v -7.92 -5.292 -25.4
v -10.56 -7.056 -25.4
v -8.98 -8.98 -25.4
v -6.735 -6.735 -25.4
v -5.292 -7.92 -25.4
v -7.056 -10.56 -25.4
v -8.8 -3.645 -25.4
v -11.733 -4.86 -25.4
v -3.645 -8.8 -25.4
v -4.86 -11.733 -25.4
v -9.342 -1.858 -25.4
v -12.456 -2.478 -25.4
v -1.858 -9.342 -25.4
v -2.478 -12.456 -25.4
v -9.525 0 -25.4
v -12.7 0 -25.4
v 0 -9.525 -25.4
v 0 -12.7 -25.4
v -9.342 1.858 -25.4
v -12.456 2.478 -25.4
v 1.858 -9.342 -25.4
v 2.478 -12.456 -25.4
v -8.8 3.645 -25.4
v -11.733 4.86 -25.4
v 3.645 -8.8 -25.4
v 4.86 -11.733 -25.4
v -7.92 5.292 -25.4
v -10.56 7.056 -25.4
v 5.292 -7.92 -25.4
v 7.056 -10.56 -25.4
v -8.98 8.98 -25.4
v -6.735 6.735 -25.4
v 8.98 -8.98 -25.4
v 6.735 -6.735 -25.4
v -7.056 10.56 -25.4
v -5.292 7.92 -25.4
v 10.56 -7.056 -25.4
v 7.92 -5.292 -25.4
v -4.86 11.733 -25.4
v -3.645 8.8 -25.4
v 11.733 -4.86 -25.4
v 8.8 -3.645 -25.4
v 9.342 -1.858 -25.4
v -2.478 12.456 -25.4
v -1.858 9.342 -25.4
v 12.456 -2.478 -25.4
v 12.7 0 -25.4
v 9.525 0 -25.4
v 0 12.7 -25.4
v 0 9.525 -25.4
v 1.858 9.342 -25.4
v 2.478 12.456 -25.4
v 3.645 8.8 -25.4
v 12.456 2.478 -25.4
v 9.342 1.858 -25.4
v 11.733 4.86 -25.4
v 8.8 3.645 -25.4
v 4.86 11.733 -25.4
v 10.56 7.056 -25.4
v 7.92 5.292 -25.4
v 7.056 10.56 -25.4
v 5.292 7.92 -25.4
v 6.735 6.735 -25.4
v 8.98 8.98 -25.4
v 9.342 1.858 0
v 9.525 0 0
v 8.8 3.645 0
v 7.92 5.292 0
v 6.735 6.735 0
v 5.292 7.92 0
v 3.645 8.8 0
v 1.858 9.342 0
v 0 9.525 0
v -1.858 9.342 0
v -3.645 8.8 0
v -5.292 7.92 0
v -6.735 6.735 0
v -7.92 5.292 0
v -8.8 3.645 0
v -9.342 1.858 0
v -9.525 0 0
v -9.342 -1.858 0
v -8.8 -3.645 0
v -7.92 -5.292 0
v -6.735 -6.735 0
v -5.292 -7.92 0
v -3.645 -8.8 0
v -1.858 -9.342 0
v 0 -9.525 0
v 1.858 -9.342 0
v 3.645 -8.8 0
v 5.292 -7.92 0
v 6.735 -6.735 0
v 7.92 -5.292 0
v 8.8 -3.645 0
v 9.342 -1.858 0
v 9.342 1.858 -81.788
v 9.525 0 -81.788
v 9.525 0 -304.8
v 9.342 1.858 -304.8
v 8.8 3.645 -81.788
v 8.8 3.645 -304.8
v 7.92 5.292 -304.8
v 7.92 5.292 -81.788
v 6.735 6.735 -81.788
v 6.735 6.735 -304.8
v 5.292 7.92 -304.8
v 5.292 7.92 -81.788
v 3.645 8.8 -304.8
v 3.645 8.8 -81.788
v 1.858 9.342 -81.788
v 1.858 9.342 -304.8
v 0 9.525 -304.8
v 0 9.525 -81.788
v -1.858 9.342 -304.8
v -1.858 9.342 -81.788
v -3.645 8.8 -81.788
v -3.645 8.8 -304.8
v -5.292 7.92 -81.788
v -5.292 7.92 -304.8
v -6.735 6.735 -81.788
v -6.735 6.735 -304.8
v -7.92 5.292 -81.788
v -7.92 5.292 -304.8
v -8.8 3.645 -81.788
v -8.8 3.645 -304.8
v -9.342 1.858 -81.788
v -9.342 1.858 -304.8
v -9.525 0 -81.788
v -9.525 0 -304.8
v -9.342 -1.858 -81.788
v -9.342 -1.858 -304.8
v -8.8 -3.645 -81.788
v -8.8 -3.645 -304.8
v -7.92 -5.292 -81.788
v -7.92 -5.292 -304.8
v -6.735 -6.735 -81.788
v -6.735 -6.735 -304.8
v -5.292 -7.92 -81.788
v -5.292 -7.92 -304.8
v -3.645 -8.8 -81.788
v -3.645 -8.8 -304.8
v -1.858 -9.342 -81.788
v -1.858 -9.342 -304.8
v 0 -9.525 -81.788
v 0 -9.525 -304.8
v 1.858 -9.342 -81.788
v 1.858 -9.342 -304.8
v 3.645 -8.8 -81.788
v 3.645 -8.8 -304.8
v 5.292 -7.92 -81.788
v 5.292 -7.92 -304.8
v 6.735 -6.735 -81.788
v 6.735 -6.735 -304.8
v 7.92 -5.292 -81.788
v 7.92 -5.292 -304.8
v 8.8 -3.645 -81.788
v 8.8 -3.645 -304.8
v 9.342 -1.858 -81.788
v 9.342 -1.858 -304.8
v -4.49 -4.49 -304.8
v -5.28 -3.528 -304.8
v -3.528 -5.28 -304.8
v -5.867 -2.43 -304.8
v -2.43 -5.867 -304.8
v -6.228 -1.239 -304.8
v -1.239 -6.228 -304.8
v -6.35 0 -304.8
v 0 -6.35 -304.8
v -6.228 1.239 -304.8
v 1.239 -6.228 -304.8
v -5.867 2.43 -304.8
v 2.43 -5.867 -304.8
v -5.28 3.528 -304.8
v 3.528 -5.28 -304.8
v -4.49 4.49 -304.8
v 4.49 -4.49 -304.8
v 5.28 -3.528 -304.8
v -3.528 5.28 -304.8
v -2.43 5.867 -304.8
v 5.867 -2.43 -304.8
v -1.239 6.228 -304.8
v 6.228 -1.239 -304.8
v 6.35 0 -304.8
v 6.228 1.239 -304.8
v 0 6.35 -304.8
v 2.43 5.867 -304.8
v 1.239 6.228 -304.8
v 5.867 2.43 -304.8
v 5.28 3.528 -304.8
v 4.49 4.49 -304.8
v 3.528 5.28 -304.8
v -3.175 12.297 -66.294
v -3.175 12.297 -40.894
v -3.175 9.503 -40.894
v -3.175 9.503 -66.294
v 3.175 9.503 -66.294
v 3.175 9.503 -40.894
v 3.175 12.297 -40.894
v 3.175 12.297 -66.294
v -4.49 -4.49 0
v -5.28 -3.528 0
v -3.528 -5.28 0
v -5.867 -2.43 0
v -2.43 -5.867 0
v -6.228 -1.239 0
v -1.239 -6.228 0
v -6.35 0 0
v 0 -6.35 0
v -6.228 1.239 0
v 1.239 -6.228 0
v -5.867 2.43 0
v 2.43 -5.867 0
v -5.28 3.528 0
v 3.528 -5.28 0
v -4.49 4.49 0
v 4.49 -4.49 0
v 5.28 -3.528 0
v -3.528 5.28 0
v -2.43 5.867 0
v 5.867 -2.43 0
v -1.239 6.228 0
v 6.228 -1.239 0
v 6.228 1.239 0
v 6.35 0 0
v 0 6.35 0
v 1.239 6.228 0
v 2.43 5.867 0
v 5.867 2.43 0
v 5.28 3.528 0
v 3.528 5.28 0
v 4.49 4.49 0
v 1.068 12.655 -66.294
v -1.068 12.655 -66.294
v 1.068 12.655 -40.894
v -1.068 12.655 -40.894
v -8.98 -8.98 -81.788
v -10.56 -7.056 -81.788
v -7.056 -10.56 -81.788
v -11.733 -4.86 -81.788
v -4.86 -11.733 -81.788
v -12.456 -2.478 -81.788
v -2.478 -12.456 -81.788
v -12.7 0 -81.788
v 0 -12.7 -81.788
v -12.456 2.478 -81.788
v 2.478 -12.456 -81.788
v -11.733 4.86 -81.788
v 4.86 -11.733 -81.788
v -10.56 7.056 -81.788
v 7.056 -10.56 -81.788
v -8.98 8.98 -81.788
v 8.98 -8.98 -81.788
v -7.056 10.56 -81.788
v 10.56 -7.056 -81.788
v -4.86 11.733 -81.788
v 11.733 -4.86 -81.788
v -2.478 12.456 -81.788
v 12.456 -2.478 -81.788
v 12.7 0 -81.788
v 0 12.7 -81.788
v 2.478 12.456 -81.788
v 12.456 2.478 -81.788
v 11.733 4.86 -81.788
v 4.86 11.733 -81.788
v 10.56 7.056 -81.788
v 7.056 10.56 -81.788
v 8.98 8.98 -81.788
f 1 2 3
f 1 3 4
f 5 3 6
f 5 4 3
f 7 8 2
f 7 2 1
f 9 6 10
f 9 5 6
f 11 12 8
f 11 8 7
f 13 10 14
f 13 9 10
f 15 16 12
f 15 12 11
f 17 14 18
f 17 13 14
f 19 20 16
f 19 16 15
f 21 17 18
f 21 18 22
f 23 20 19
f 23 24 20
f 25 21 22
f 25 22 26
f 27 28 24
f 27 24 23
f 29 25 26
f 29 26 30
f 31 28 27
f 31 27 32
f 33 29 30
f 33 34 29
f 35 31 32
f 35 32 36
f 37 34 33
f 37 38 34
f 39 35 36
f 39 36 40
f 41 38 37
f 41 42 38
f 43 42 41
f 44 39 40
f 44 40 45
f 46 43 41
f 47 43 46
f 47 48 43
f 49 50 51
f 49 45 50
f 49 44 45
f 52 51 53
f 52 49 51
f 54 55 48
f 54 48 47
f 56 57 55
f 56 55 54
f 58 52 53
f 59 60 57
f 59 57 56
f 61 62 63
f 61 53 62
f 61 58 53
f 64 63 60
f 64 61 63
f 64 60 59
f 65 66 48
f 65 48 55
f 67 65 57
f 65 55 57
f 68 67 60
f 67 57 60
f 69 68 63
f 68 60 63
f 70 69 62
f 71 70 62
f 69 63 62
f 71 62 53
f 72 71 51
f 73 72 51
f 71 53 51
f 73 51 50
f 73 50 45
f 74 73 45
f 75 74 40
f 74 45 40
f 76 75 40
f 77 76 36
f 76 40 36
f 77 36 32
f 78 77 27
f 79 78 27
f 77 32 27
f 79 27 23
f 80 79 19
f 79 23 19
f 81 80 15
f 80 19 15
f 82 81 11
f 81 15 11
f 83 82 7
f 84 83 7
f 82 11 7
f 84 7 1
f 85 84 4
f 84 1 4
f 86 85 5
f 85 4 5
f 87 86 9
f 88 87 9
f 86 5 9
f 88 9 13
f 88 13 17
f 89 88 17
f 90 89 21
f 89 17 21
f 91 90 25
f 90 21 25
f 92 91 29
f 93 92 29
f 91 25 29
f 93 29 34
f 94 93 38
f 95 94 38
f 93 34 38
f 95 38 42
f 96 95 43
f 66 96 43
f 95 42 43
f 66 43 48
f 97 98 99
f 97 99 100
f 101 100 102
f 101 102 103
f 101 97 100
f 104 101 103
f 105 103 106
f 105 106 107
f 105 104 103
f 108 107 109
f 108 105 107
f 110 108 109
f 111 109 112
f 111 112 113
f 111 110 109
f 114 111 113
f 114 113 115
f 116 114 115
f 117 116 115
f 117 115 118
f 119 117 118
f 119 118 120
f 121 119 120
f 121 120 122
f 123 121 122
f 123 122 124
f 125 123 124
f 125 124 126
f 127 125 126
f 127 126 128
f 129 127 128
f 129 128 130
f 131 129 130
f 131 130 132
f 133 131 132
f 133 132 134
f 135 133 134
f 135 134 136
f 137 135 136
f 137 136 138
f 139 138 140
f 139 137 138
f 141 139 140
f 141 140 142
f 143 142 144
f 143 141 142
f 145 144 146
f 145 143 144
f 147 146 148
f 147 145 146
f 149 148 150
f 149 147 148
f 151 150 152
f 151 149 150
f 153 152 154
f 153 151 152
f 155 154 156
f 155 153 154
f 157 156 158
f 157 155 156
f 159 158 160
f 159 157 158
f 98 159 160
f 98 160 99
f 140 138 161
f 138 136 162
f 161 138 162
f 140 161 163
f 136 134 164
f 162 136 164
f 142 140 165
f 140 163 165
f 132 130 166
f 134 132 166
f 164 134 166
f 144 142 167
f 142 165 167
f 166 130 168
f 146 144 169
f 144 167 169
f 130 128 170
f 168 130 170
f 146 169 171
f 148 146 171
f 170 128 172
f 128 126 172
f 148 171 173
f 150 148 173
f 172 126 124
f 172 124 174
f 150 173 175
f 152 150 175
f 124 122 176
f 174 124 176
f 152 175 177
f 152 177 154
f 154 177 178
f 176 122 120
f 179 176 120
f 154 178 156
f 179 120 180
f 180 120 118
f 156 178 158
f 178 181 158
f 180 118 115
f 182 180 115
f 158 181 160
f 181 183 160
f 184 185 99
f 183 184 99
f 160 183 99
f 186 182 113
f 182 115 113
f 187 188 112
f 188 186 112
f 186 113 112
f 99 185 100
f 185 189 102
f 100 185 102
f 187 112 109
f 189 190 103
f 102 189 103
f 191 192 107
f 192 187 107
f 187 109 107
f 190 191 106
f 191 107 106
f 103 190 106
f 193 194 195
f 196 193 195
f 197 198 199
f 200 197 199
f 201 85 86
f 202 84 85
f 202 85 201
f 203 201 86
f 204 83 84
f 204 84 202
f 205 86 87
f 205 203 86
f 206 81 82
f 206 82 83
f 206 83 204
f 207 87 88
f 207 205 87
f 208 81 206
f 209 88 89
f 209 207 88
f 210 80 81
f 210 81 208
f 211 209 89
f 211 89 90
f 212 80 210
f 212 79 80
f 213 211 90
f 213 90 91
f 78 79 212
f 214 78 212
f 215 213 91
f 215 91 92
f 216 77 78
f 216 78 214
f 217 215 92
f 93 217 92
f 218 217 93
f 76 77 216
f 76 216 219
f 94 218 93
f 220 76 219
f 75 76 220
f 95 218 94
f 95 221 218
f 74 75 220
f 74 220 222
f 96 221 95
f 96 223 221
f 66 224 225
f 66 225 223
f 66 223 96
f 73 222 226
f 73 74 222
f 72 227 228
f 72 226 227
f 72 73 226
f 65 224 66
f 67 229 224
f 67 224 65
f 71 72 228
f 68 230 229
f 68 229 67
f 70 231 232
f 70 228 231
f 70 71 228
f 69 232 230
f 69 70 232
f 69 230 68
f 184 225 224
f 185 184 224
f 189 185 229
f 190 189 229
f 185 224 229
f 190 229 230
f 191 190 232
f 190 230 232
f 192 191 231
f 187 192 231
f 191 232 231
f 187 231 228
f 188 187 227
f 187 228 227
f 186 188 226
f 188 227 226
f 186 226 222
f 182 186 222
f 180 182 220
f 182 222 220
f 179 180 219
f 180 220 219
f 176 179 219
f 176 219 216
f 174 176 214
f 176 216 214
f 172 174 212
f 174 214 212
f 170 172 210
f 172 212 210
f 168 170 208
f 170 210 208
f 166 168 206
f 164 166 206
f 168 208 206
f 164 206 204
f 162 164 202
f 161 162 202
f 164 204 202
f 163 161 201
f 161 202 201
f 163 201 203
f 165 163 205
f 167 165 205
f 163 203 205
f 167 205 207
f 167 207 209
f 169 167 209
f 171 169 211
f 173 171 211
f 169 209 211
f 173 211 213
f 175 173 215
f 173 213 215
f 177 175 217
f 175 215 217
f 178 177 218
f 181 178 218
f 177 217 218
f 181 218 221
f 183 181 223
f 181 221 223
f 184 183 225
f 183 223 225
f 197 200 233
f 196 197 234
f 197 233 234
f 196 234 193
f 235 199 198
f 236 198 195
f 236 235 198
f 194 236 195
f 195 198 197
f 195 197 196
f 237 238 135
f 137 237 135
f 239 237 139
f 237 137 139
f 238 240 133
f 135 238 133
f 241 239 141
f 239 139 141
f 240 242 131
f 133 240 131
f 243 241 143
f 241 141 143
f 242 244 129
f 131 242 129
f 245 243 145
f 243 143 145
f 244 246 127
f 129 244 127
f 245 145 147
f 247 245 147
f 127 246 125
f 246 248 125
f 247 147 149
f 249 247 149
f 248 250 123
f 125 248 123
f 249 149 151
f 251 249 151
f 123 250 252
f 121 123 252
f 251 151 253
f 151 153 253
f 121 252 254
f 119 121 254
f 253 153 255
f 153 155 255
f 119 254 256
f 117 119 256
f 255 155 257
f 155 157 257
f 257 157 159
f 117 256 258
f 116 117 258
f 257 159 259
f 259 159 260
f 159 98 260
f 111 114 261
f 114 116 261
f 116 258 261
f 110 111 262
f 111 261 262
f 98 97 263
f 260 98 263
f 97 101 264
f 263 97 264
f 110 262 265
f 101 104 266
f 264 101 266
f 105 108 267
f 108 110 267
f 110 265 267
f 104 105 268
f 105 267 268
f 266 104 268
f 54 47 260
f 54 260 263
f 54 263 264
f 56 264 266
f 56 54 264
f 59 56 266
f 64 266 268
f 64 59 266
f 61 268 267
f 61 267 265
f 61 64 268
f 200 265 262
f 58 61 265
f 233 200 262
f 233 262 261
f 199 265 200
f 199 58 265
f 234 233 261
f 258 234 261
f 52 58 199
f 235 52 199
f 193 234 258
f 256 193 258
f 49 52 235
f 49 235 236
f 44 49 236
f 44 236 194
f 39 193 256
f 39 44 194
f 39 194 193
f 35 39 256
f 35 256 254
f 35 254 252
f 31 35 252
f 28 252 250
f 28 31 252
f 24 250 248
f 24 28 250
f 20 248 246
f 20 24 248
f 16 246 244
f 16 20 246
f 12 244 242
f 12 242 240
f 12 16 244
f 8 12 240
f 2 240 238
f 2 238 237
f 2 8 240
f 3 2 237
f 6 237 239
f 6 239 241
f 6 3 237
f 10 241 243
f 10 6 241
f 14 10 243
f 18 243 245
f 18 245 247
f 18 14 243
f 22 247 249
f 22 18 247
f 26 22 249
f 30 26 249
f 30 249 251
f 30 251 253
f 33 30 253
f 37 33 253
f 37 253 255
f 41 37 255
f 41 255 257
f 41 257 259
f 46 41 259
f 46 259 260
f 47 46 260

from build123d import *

# Parameters (mm, degrees)
SKETCH1_R           = 12.7
SKETCH1_R_2         = 6.35
BOSS_EXTRUDE1_DEPTH = 304.8
SKETCH3_R           = 19.05
SKETCH3_R_2         = 9.525
CUT_EXTRUDE2_DEPTH  = 254
CUT_EXTRUDE3_DEPTH  = 25.4
CUT_EXTRUDE5_START  = -25.4
SKETCH2_R           = 19.05
SKETCH2_R_2         = 9.525
CUT_EXTRUDE5_DEPTH  = 25.4


with BuildPart() as part:
    # Sketch1 → Boss-Extrude1 (new body)
    with BuildSketch(Plane.XY):
        Circle(SKETCH1_R)
        Circle(SKETCH1_R_2, mode=Mode.SUBTRACT)
    extrude(amount=-BOSS_EXTRUDE1_DEPTH)

    # Sketch3 → Cut-Extrude2 (cut)
    with BuildSketch(Plane.XY.offset(-81.788)):
        Circle(SKETCH3_R)
        Circle(SKETCH3_R_2, mode=Mode.SUBTRACT)
    extrude(amount=-CUT_EXTRUDE2_DEPTH, mode=Mode.SUBTRACT)

    # Sketch4 → Cut-Extrude3 (cut)
    with BuildSketch(Plane.XY.offset(-40.894)):
        Polygon((-3.175, 12.296722124), (-3.175, 15.852722124), (3.175, 15.852722124), (3.175, 12.296722124), (3.175, 9.502722124), (-3.175, 9.502722124), align=None)
    extrude(amount=-CUT_EXTRUDE3_DEPTH, mode=Mode.SUBTRACT)

    # Sketch2 → Cut-Extrude5 (cut)
    with BuildSketch(Plane.XY.offset(CUT_EXTRUDE5_START)):
        Circle(SKETCH2_R)
        Circle(SKETCH2_R_2, mode=Mode.SUBTRACT)
    extrude(amount=CUT_EXTRUDE5_DEPTH, mode=Mode.SUBTRACT)


solid = part.part
